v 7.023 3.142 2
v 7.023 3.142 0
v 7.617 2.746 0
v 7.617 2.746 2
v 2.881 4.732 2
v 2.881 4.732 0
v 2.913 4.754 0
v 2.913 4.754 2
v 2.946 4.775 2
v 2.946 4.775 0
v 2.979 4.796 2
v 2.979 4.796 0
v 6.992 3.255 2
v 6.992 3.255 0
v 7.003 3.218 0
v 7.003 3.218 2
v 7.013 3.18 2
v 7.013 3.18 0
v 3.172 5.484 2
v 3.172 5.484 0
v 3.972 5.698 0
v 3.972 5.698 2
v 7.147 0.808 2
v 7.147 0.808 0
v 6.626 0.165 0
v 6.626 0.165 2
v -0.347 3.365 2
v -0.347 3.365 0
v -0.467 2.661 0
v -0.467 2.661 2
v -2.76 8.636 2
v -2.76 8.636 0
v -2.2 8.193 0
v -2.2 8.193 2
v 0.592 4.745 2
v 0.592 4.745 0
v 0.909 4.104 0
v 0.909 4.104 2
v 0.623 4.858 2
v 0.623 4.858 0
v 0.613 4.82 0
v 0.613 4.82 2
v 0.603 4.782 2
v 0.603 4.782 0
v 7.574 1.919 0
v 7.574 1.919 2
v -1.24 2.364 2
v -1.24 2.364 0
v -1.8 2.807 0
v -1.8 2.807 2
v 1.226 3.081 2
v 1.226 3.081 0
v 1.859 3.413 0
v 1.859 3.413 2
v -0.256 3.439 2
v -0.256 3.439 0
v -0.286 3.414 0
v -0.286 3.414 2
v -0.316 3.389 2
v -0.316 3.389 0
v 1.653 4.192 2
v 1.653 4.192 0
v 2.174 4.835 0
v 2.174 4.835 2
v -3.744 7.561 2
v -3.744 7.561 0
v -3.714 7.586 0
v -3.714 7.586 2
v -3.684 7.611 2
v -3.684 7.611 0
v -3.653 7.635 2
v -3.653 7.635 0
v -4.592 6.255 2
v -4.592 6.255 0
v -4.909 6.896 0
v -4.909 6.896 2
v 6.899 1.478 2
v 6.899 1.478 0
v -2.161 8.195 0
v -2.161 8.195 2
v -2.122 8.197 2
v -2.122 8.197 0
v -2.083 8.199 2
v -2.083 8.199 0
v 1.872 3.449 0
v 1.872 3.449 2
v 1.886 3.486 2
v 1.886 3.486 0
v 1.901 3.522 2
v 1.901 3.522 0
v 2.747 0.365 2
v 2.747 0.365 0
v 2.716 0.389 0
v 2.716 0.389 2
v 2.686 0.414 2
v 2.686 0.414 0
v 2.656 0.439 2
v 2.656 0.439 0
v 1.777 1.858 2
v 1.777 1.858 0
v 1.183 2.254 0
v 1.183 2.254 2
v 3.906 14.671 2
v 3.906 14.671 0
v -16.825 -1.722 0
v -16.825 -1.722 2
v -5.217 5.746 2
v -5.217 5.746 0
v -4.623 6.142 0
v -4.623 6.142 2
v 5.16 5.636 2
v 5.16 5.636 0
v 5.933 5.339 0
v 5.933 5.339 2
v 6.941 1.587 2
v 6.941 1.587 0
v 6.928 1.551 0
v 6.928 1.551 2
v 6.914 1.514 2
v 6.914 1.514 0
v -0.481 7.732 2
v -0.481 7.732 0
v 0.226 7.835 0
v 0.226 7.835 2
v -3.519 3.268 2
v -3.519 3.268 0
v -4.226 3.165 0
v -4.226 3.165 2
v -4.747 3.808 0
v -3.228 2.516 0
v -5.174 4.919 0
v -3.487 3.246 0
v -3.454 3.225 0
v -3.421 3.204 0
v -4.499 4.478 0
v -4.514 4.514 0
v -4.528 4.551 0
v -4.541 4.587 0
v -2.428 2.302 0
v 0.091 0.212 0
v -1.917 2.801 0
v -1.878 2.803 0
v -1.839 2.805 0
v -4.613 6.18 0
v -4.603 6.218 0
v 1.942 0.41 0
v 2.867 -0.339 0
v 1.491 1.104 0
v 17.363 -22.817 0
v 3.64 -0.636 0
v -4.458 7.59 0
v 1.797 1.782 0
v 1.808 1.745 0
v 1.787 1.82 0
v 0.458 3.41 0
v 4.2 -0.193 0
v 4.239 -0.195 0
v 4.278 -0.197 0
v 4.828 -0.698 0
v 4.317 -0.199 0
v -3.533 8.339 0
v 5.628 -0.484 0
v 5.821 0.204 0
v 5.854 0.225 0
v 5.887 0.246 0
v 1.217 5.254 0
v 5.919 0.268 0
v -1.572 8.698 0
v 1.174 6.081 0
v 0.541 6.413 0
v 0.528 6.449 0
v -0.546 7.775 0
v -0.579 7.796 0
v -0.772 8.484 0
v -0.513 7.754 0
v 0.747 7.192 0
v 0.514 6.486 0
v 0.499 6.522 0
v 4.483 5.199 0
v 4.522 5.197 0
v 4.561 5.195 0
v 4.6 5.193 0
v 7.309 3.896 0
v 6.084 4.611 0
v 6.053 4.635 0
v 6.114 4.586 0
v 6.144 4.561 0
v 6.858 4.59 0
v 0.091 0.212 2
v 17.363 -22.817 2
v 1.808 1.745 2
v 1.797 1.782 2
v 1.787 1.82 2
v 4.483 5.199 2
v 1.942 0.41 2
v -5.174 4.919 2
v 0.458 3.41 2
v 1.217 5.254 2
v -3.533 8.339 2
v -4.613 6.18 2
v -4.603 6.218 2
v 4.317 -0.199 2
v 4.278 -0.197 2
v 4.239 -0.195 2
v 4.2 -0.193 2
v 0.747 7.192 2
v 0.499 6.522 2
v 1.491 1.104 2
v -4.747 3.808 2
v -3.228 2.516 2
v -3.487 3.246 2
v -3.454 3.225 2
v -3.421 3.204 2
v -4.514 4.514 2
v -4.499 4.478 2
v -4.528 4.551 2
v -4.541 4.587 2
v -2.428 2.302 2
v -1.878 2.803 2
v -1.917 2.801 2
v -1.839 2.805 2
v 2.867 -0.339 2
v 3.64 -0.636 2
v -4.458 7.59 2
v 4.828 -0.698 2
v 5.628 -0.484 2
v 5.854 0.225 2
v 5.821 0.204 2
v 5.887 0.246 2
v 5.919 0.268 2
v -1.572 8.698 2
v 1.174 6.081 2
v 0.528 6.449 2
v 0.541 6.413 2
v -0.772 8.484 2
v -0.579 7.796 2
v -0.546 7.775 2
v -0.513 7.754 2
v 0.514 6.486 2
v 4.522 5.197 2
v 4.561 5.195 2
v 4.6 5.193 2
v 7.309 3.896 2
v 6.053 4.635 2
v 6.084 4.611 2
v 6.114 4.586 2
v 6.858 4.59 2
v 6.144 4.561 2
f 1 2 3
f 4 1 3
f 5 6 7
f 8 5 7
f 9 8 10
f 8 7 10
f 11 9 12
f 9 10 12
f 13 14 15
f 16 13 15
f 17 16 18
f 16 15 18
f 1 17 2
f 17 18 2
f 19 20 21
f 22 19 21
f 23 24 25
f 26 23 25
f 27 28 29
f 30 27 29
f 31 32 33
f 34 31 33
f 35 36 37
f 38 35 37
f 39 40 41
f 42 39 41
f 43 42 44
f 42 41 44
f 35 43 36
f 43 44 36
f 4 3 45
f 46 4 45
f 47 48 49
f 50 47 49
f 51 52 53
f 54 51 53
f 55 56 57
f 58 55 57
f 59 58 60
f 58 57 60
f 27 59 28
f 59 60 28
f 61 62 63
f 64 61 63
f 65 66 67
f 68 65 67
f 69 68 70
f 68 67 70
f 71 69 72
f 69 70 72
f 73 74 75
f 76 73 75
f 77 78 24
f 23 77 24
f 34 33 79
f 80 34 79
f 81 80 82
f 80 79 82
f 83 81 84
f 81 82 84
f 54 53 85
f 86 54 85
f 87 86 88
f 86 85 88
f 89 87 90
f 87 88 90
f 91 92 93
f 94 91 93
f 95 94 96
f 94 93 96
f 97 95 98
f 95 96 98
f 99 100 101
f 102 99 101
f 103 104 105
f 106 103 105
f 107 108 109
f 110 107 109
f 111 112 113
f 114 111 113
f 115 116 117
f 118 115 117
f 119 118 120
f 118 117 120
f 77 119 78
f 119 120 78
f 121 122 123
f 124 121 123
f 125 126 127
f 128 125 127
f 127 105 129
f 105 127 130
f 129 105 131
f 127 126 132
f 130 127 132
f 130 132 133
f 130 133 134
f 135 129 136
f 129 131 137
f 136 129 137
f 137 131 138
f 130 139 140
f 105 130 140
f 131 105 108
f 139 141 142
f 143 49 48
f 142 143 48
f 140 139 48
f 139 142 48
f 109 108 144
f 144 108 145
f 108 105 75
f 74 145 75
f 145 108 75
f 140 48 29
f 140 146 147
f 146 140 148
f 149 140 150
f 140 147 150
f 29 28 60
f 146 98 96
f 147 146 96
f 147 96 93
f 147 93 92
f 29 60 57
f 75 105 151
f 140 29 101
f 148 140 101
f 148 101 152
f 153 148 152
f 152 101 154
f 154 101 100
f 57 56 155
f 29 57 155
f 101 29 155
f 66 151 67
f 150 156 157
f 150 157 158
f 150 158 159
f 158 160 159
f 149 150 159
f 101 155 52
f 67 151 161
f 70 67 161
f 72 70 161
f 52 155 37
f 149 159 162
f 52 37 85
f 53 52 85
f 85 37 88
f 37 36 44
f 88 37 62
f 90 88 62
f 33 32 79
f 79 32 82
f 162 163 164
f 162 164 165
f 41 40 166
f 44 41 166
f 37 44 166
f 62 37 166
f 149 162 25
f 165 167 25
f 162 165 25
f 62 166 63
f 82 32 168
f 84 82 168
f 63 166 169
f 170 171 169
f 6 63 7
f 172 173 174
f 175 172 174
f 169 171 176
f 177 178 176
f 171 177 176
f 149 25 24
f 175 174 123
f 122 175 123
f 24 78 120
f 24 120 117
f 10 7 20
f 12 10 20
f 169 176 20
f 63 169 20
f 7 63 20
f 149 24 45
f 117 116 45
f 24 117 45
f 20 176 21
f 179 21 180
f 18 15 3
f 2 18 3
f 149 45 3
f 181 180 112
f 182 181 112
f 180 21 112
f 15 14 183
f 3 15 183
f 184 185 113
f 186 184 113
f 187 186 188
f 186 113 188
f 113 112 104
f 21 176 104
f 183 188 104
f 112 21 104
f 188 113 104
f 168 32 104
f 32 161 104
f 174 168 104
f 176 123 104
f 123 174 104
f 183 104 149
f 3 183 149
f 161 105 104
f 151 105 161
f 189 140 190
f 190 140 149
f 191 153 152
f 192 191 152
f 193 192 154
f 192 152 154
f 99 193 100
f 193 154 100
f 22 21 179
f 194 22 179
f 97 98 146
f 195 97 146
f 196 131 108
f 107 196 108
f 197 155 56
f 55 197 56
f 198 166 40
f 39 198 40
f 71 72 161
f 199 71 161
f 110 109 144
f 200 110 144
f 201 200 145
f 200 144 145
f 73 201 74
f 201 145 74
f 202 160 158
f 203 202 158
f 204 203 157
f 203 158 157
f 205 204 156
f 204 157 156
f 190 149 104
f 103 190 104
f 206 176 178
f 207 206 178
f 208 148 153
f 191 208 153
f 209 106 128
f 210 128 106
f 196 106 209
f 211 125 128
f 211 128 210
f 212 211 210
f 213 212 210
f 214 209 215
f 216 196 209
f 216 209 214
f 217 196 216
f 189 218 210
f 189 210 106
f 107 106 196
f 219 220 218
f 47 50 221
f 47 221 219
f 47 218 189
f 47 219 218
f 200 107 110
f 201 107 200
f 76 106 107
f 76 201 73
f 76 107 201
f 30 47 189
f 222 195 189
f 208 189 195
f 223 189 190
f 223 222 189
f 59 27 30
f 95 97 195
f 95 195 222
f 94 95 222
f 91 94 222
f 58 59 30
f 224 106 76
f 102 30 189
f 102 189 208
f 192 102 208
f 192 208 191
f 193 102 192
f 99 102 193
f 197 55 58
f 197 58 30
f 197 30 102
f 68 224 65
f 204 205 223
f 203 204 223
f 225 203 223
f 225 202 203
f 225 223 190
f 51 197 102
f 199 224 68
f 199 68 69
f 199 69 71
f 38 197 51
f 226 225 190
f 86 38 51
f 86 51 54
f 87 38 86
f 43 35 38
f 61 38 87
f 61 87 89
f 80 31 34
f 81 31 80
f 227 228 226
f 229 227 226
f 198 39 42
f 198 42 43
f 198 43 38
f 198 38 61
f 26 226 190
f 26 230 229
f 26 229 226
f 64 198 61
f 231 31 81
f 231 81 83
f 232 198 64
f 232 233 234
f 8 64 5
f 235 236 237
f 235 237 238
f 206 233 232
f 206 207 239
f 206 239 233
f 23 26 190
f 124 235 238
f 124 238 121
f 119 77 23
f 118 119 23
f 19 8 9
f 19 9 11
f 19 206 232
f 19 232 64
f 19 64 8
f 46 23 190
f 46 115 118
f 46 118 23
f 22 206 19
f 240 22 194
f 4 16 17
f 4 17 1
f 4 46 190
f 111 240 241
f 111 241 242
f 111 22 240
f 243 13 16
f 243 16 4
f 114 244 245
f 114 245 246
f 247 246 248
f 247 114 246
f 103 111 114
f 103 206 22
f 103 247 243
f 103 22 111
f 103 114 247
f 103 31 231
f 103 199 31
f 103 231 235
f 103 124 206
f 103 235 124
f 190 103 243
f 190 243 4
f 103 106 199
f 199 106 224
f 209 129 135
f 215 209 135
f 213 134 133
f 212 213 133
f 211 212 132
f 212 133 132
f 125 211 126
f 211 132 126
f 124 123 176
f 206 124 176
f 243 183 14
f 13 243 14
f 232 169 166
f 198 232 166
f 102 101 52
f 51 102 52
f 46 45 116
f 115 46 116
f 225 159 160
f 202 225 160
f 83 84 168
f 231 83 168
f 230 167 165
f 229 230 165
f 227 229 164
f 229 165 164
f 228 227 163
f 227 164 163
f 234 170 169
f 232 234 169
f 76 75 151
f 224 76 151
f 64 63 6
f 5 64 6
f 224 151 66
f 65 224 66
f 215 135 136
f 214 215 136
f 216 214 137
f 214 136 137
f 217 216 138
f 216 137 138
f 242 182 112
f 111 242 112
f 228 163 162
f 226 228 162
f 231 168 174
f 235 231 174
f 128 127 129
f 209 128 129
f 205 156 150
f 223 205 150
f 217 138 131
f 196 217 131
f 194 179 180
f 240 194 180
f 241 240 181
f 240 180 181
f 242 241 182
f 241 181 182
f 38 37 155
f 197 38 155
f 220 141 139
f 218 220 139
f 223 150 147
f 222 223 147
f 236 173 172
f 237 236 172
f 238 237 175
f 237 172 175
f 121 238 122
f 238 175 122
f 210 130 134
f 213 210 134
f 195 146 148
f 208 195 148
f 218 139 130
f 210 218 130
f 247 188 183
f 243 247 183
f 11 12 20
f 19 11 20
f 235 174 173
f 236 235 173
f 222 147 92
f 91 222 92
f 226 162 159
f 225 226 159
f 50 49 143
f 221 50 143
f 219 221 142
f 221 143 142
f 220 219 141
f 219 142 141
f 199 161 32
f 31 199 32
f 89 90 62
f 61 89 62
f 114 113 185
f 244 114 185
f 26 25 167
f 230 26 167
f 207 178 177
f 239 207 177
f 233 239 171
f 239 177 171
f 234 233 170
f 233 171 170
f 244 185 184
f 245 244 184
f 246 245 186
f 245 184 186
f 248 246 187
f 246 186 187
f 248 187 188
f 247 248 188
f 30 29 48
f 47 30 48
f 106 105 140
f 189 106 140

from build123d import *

# Parameters (mm, degrees)
F1_DEPTH = 2


with BuildPart() as f1:
    # F0 (on Top) → F1 (new body)
    with BuildSketch(Plane.XY):
        Polygon((17.362918, -22.817224), (3.905775, 14.67053), (-16.825457, -1.721608), (0.091206, 0.211725), align=None)
        with BuildLine():
            ThreePointArc((-4.499081, 4.477946), (-4.520667, 4.532407), (-4.541067, 4.587323))
            Line((-4.541067, 4.587323), (-5.173952, 4.919177))
            Line((-5.173952, 4.919177), (-5.217277, 5.745873))
            Line((-5.217277, 5.745873), (-4.622547, 6.142063))
            ThreePointArc((-4.622547, 6.142063), (-4.608, 6.198811), (-4.592224, 6.25523))
            Line((-4.592224, 6.25523), (-4.90918, 6.895706))
            Line((-4.90918, 6.895706), (-4.458311, 7.589984))
            Line((-4.458311, 7.589984), (-3.74429, 7.560935))
            ThreePointArc((-3.74429, 7.560935), (-3.699165, 7.598294), (-3.65324, 7.634665))
            Line((-3.65324, 7.634665), (-3.533201, 8.339123))
            Line((-3.533201, 8.339123), (-2.760354, 8.635791))
            Line((-2.760354, 8.635791), (-2.199773, 8.192599))
            ThreePointArc((-2.199773, 8.192599), (-2.141307, 8.1963), (-2.082775, 8.198731))
            Line((-2.082775, 8.198731), (-1.571591, 8.698092))
            Line((-1.571591, 8.698092), (-0.771967, 8.483833))
            Line((-0.771967, 8.483833), (-0.57895, 7.795782))
            ThreePointArc((-0.57895, 7.795782), (-0.529475, 7.764411), (-0.480692, 7.731973))
            Line((-0.480692, 7.731973), (0.226382, 7.835498))
            Line((0.226382, 7.835498), (0.747352, 7.192153))
            Line((0.747352, 7.192153), (0.499081, 6.522054))
            ThreePointArc((0.499081, 6.522054), (0.520667, 6.467593), (0.541067, 6.412677))
            Line((0.541067, 6.412677), (1.173952, 6.080823))
            Line((1.173952, 6.080823), (1.217277, 5.254127))
            Line((1.217277, 5.254127), (0.622547, 4.857937))
            ThreePointArc((0.622547, 4.857937), (0.608, 4.801189), (0.592224, 4.74477))
            Line((0.592224, 4.74477), (0.90918, 4.104294))
            Line((0.90918, 4.104294), (0.458311, 3.410016))
            Line((0.458311, 3.410016), (-0.25571, 3.439065))
            ThreePointArc((-0.25571, 3.439065), (-0.300835, 3.401706), (-0.34676, 3.365335))
            Line((-0.34676, 3.365335), (-0.466799, 2.660877))
            Line((-0.466799, 2.660877), (-1.239646, 2.364209))
            Line((-1.239646, 2.364209), (-1.800227, 2.807401))
            ThreePointArc((-1.800227, 2.807401), (-1.858693, 2.8037), (-1.917225, 2.801269))
            Line((-1.917225, 2.801269), (-2.428409, 2.301908))
            Line((-2.428409, 2.301908), (-3.228033, 2.516167))
            Line((-3.228033, 2.516167), (-3.42105, 3.204218))
            ThreePointArc((-3.42105, 3.204218), (-3.470525, 3.235589), (-3.519308, 3.268027))
            Line((-3.519308, 3.268027), (-4.226382, 3.164502))
            Line((-4.226382, 3.164502), (-4.747352, 3.807847))
            Line((-4.747352, 3.807847), (-4.499081, 4.477946))
        make_face(mode=Mode.SUBTRACT)
        with BuildLine():
            ThreePointArc((2.880692, 4.731973), (2.929475, 4.764411), (2.97895, 4.795782))
            Line((2.97895, 4.795782), (3.171967, 5.483833))
            Line((3.171967, 5.483833), (3.971591, 5.698092))
            Line((3.971591, 5.698092), (4.482775, 5.198731))
            ThreePointArc((4.482775, 5.198731), (4.541307, 5.1963), (4.599773, 5.192599))
            Line((4.599773, 5.192599), (5.160354, 5.635791))
            Line((5.160354, 5.635791), (5.933201, 5.339123))
            Line((5.933201, 5.339123), (6.05324, 4.634665))
            ThreePointArc((6.05324, 4.634665), (6.099165, 4.598294), (6.14429, 4.560935))
            Line((6.14429, 4.560935), (6.858311, 4.589984))
            Line((6.858311, 4.589984), (7.30918, 3.895706))
            Line((7.30918, 3.895706), (6.992224, 3.25523))
            ThreePointArc((6.992224, 3.25523), (7.008, 3.198811), (7.022547, 3.142063))
            Line((7.022547, 3.142063), (7.617277, 2.745873))
            Line((7.617277, 2.745873), (7.573952, 1.919177))
            Line((7.573952, 1.919177), (6.941067, 1.587323))
            ThreePointArc((6.941067, 1.587323), (6.920667, 1.532407), (6.899081, 1.477946))
            Line((6.899081, 1.477946), (7.147352, 0.807847))
            Line((7.147352, 0.807847), (6.626382, 0.164502))
            Line((6.626382, 0.164502), (5.919308, 0.268027))
            ThreePointArc((5.919308, 0.268027), (5.870525, 0.235589), (5.82105, 0.204218))
            Line((5.82105, 0.204218), (5.628033, -0.483833))
            Line((5.628033, -0.483833), (4.828409, -0.698092))
            Line((4.828409, -0.698092), (4.317225, -0.198731))
            ThreePointArc((4.317225, -0.198731), (4.258693, -0.1963), (4.200227, -0.192599))
            Line((4.200227, -0.192599), (3.639646, -0.635791))
            Line((3.639646, -0.635791), (2.866799, -0.339123))
            Line((2.866799, -0.339123), (2.74676, 0.365335))
            ThreePointArc((2.74676, 0.365335), (2.700835, 0.401706), (2.65571, 0.439065))
            Line((2.65571, 0.439065), (1.941689, 0.410016))
            Line((1.941689, 0.410016), (1.49082, 1.104294))
            Line((1.49082, 1.104294), (1.807776, 1.74477))
            ThreePointArc((1.807776, 1.74477), (1.792, 1.801189), (1.777453, 1.857937))
            Line((1.777453, 1.857937), (1.182723, 2.254127))
            Line((1.182723, 2.254127), (1.226048, 3.080823))
            Line((1.226048, 3.080823), (1.858933, 3.412677))
            ThreePointArc((1.858933, 3.412677), (1.879333, 3.467593), (1.900919, 3.522054))
            Line((1.900919, 3.522054), (1.652648, 4.192153))
            Line((1.652648, 4.192153), (2.173618, 4.835498))
            Line((2.173618, 4.835498), (2.880692, 4.731973))
        make_face(mode=Mode.SUBTRACT)
    extrude(amount=F1_DEPTH)


solid = f1.part
